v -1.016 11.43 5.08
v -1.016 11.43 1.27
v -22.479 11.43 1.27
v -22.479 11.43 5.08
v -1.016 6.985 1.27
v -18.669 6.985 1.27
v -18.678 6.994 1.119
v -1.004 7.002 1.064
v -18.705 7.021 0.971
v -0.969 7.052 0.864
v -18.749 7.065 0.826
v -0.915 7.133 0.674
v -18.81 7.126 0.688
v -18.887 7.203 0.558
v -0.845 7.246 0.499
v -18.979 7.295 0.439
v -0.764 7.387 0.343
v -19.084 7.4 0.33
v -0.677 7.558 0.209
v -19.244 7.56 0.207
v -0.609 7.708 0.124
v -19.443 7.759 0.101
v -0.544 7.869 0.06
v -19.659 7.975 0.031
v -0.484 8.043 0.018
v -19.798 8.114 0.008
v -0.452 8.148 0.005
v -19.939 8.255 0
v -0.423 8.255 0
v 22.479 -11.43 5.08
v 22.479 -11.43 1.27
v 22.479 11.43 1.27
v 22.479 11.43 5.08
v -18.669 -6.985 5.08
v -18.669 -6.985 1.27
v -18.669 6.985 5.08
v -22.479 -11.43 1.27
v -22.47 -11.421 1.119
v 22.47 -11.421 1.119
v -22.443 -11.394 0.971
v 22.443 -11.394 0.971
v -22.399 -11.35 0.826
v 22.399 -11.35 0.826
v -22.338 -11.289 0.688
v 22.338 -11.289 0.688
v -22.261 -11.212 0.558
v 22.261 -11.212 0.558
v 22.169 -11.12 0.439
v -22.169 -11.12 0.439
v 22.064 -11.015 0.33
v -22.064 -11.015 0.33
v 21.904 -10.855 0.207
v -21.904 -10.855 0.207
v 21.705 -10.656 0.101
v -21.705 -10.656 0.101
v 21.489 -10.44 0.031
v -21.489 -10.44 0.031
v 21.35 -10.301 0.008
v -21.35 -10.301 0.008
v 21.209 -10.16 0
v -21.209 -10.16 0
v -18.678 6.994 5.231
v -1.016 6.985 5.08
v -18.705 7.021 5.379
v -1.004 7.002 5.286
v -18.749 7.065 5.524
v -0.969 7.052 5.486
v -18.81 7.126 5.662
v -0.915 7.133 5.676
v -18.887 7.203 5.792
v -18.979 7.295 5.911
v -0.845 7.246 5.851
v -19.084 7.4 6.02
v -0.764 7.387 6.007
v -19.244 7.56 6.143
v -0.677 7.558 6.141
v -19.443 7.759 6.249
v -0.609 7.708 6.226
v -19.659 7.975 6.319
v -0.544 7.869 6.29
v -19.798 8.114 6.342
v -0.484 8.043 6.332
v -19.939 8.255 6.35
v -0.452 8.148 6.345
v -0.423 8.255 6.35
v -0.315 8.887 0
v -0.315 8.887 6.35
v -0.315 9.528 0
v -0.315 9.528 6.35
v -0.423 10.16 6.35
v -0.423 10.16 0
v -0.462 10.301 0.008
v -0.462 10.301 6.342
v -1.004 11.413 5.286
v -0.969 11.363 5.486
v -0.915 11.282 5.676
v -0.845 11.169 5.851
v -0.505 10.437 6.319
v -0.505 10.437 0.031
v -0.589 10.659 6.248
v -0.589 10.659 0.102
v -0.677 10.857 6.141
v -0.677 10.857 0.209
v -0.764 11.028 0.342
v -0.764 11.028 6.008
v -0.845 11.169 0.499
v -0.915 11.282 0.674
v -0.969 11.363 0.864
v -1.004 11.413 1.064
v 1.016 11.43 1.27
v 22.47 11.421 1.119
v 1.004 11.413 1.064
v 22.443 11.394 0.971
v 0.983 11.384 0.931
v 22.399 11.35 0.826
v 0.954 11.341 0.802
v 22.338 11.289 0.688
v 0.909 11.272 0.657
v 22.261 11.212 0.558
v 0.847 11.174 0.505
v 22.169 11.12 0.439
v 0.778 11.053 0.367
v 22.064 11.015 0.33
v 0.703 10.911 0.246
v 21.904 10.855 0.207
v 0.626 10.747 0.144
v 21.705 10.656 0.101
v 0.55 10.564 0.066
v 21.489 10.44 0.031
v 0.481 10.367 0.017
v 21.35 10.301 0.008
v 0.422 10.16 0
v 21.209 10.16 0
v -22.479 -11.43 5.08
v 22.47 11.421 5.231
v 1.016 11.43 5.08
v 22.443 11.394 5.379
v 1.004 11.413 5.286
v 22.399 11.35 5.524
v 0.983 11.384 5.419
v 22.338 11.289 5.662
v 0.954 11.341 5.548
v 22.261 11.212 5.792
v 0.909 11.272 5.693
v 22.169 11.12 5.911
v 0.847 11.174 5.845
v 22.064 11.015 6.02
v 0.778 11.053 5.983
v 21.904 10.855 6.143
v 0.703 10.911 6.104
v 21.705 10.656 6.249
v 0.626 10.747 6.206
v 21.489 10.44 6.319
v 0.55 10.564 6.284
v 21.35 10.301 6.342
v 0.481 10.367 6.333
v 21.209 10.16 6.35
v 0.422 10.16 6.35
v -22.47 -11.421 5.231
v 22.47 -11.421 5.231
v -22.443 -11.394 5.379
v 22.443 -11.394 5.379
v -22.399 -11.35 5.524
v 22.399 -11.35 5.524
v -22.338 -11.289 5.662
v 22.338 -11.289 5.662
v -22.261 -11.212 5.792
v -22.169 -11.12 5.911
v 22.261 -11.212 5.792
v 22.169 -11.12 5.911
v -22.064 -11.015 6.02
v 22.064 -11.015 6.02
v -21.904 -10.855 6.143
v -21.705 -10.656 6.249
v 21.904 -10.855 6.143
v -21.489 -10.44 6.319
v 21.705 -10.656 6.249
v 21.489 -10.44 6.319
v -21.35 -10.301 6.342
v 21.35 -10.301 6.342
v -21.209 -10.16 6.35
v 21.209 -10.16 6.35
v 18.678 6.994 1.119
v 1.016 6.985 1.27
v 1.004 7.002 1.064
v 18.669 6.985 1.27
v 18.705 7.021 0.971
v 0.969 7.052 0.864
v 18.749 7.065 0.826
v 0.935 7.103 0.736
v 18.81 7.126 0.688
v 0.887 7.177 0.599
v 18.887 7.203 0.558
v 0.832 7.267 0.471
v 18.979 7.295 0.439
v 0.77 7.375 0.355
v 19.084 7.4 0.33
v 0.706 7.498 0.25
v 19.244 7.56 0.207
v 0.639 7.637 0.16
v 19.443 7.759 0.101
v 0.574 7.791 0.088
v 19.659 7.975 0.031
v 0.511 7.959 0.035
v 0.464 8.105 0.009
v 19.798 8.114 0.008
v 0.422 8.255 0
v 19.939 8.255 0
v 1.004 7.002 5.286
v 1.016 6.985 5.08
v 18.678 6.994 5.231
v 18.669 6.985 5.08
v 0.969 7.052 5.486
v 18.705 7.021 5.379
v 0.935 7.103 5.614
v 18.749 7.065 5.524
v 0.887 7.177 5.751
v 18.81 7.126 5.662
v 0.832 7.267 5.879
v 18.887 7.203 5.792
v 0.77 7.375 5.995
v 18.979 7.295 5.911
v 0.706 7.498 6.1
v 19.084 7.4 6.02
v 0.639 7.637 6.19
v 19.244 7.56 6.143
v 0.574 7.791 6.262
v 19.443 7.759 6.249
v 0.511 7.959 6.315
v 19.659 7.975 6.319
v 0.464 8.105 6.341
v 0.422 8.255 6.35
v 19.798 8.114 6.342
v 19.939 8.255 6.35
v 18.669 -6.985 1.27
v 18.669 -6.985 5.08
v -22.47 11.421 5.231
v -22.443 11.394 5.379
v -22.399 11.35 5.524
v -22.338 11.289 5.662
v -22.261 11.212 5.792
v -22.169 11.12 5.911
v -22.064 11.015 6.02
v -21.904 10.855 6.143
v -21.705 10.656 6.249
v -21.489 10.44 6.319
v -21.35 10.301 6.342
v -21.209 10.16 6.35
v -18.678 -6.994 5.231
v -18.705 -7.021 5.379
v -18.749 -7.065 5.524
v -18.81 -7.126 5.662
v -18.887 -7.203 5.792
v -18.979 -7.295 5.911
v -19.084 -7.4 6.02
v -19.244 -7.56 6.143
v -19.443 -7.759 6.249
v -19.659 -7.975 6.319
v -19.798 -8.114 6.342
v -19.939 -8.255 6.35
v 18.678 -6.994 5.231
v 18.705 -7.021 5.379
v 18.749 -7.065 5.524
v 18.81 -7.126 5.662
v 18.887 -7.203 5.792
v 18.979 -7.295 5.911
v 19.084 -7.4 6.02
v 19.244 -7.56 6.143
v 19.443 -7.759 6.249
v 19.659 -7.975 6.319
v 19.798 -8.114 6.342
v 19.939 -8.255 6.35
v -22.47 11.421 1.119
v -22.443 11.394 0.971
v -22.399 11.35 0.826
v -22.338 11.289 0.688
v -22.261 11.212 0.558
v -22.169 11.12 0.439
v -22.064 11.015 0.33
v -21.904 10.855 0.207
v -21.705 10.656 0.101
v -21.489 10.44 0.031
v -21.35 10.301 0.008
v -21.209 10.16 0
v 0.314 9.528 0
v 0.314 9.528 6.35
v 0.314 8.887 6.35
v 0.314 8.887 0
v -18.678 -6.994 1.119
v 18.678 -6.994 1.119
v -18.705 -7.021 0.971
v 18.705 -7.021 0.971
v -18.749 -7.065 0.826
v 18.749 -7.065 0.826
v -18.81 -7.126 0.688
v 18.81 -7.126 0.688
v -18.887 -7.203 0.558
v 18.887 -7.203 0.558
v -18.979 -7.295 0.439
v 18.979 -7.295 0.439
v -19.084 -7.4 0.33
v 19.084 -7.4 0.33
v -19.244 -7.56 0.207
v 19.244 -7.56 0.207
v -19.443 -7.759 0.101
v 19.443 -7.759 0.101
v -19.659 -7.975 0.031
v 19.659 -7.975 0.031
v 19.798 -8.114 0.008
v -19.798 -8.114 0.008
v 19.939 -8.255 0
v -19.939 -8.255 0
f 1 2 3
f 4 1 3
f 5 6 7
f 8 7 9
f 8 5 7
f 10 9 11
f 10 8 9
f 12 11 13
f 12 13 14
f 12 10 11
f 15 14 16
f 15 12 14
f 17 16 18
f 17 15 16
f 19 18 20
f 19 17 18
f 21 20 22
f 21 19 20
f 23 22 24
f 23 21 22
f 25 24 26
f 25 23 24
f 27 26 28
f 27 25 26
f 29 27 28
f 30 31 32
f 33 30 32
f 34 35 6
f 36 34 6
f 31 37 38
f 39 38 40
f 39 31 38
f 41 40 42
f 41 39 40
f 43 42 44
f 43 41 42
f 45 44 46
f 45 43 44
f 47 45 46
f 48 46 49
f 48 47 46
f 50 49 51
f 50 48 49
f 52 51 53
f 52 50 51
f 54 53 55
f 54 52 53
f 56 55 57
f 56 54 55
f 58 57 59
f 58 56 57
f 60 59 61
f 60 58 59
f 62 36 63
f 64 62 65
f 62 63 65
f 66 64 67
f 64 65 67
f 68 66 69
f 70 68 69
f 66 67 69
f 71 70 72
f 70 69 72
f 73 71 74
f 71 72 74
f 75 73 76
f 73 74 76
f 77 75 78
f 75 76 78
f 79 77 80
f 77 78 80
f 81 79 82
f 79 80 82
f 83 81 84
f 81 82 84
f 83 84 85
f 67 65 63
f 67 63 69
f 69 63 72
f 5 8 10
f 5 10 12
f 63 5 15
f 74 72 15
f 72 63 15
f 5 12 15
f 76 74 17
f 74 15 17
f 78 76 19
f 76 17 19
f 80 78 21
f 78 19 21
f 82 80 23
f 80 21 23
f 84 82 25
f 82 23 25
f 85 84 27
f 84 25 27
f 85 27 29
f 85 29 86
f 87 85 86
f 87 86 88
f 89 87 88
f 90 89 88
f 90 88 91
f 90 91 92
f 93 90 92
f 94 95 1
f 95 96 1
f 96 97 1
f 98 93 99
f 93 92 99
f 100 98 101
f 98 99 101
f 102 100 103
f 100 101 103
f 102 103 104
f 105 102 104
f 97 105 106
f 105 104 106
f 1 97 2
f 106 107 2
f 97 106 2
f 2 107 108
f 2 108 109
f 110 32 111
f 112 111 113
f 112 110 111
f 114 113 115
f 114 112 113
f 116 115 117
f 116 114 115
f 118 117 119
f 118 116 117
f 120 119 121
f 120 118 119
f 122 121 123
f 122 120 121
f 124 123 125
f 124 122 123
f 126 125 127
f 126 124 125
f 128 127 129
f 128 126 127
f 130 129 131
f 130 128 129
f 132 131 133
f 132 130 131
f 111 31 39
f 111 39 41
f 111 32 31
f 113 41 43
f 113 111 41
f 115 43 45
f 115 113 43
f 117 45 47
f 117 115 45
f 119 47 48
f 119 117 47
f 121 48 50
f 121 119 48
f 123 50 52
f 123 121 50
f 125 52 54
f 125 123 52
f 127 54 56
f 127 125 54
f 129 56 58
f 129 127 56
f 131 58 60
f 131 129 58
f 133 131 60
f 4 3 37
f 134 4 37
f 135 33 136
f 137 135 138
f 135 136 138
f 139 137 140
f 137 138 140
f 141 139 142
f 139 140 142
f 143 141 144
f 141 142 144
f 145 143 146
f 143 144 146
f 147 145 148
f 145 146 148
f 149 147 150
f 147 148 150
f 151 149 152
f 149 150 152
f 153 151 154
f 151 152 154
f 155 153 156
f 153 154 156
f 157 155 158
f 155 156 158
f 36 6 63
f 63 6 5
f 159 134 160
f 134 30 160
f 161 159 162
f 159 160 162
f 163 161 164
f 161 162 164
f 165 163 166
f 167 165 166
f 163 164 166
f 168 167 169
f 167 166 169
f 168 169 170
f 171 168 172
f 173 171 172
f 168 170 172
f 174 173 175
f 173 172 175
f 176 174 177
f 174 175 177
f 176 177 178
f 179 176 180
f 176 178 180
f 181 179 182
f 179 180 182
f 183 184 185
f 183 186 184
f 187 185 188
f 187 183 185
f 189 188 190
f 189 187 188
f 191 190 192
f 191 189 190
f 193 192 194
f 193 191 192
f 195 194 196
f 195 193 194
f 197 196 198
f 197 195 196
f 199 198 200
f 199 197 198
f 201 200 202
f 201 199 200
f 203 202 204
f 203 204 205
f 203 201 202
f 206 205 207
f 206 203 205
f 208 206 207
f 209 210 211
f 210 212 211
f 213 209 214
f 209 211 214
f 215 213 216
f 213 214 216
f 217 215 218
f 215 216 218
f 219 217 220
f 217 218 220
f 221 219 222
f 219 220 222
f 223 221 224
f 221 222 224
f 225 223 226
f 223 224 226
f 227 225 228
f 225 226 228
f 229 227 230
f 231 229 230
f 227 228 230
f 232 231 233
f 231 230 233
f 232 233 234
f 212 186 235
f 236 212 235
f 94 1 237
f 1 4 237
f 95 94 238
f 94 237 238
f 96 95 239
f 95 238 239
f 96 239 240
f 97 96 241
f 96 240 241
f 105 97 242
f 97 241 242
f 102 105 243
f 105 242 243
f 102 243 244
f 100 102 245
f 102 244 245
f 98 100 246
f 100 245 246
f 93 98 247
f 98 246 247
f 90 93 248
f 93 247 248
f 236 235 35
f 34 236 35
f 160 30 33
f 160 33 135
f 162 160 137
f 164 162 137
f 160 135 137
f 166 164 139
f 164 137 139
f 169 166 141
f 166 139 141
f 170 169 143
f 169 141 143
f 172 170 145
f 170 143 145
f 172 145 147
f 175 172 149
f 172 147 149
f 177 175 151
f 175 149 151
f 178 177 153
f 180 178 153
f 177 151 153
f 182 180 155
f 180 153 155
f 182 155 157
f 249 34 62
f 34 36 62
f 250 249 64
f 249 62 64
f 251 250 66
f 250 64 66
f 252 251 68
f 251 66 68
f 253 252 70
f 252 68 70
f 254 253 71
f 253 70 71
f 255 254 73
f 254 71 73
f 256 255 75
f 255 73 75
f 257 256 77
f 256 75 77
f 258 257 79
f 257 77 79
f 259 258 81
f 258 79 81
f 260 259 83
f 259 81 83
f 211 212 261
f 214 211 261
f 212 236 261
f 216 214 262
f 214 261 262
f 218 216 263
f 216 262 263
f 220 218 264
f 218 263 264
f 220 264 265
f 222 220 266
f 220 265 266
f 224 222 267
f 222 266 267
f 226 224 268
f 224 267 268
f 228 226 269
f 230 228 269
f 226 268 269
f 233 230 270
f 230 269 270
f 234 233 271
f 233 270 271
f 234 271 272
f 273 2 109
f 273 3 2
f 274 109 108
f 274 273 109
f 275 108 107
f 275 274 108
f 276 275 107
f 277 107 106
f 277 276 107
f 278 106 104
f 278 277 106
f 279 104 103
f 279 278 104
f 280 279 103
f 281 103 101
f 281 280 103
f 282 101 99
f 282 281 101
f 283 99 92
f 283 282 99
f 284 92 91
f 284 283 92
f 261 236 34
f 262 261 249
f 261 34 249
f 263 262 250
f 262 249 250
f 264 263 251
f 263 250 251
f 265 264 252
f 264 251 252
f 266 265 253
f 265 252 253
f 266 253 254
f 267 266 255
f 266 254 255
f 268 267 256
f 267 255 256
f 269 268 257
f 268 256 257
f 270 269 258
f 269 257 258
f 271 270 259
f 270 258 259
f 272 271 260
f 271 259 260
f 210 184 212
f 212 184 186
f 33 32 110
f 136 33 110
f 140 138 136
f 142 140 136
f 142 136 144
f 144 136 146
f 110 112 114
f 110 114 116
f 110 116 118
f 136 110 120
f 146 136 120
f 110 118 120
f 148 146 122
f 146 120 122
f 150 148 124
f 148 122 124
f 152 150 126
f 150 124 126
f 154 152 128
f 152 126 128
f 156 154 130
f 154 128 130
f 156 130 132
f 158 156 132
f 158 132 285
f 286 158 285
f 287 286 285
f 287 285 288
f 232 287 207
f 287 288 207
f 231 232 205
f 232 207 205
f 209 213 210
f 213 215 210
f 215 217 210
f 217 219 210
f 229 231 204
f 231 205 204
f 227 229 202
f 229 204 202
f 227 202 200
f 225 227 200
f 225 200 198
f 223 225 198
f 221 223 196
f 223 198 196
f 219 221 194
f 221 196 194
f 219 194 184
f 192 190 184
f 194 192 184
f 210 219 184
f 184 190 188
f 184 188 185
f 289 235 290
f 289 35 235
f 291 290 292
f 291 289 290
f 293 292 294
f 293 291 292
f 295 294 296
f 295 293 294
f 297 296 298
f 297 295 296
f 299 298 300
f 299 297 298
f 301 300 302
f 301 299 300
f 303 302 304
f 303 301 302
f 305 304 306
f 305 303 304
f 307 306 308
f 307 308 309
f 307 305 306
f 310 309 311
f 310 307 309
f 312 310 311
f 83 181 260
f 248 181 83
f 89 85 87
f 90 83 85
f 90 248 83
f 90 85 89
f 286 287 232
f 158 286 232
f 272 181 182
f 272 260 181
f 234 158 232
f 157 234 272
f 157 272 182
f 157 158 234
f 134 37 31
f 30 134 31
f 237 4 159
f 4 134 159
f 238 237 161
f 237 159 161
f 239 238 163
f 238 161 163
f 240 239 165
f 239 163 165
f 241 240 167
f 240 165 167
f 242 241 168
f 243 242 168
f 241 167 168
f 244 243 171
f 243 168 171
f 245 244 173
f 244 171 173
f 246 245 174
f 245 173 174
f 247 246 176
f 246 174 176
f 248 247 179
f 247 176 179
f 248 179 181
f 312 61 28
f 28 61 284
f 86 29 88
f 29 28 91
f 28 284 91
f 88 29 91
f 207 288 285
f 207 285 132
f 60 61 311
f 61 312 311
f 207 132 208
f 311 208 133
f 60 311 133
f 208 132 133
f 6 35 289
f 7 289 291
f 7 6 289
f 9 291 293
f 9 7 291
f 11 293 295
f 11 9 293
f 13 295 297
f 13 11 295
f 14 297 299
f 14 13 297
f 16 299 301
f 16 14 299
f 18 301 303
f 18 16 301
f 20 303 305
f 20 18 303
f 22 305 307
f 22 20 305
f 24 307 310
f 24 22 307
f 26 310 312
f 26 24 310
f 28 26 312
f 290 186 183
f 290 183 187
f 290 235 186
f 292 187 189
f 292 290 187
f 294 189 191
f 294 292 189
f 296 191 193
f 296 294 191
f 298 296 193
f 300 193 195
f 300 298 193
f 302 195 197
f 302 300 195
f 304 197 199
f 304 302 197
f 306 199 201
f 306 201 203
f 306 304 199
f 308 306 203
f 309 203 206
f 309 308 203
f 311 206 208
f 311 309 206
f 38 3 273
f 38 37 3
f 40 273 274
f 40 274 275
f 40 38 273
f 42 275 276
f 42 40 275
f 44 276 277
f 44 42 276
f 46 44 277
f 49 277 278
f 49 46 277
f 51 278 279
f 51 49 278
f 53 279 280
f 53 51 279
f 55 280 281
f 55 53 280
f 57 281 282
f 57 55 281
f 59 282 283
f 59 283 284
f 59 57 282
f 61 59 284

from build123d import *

# Parameters (mm, degrees)
F1_DEPTH = 6.35
F2_R     = 1.27


with BuildPart() as f1:
    # F0 (on Top) → F1 (new body)
    with BuildSketch(Plane.XY):
        Polygon((-22.479, -11.43), (22.479, -11.43), (22.479, 11.43), (1.016, 11.43), (1.016, 6.985), (18.669, 6.985), (18.669, -6.985), (-18.669, -6.985), (-18.669, 6.985), (-1.016, 6.985), (-1.016, 11.43), (-22.479, 11.43), align=None)
        with BuildLine():
            ThreePointArc((-1.016, 6.985), (-0.302004, 9.2075), (-1.016, 11.43))
            Line((-1.016, 11.43), (-1.016, 6.985))
        make_face()
        with BuildLine():
            Line((1.016, 6.985), (1.016, 11.43))
            ThreePointArc((1.016, 11.43), (0.300607, 9.2075), (1.016, 6.985))
        make_face()
    extrude(amount=F1_DEPTH)

    # F2
    f2_edges = [f1.edges().sort_by_distance(p)[0] for p in [
        (-9.8425, 6.985, 6.35),
        (9.8425, 6.985, 6.35),
        (18.669, 0, 6.35),
        (0, -6.985, 6.35),
        (-18.669, 0, 6.35),
        (0, -6.985, 0),
        (18.669, 0, 0),
        (9.8425, 6.985, 0),
        (-9.8425, 6.985, 0),
        (-18.669, 0, 0),
        (11.7475, 11.43, 6.35),
        (-11.7475, 11.43, 6.35),
        (-22.479, 0, 6.35),
        (0, -11.43, 6.35),
        (22.479, 0, 6.35),
        (22.479, 0, 0),
        (0, -11.43, 0),
        (11.7475, 11.43, 0),
        (-11.7475, 11.43, 0),
        (-22.479, 0, 0),
    ]]
    fillet(f2_edges, radius=F2_R)


solid = f1.part
